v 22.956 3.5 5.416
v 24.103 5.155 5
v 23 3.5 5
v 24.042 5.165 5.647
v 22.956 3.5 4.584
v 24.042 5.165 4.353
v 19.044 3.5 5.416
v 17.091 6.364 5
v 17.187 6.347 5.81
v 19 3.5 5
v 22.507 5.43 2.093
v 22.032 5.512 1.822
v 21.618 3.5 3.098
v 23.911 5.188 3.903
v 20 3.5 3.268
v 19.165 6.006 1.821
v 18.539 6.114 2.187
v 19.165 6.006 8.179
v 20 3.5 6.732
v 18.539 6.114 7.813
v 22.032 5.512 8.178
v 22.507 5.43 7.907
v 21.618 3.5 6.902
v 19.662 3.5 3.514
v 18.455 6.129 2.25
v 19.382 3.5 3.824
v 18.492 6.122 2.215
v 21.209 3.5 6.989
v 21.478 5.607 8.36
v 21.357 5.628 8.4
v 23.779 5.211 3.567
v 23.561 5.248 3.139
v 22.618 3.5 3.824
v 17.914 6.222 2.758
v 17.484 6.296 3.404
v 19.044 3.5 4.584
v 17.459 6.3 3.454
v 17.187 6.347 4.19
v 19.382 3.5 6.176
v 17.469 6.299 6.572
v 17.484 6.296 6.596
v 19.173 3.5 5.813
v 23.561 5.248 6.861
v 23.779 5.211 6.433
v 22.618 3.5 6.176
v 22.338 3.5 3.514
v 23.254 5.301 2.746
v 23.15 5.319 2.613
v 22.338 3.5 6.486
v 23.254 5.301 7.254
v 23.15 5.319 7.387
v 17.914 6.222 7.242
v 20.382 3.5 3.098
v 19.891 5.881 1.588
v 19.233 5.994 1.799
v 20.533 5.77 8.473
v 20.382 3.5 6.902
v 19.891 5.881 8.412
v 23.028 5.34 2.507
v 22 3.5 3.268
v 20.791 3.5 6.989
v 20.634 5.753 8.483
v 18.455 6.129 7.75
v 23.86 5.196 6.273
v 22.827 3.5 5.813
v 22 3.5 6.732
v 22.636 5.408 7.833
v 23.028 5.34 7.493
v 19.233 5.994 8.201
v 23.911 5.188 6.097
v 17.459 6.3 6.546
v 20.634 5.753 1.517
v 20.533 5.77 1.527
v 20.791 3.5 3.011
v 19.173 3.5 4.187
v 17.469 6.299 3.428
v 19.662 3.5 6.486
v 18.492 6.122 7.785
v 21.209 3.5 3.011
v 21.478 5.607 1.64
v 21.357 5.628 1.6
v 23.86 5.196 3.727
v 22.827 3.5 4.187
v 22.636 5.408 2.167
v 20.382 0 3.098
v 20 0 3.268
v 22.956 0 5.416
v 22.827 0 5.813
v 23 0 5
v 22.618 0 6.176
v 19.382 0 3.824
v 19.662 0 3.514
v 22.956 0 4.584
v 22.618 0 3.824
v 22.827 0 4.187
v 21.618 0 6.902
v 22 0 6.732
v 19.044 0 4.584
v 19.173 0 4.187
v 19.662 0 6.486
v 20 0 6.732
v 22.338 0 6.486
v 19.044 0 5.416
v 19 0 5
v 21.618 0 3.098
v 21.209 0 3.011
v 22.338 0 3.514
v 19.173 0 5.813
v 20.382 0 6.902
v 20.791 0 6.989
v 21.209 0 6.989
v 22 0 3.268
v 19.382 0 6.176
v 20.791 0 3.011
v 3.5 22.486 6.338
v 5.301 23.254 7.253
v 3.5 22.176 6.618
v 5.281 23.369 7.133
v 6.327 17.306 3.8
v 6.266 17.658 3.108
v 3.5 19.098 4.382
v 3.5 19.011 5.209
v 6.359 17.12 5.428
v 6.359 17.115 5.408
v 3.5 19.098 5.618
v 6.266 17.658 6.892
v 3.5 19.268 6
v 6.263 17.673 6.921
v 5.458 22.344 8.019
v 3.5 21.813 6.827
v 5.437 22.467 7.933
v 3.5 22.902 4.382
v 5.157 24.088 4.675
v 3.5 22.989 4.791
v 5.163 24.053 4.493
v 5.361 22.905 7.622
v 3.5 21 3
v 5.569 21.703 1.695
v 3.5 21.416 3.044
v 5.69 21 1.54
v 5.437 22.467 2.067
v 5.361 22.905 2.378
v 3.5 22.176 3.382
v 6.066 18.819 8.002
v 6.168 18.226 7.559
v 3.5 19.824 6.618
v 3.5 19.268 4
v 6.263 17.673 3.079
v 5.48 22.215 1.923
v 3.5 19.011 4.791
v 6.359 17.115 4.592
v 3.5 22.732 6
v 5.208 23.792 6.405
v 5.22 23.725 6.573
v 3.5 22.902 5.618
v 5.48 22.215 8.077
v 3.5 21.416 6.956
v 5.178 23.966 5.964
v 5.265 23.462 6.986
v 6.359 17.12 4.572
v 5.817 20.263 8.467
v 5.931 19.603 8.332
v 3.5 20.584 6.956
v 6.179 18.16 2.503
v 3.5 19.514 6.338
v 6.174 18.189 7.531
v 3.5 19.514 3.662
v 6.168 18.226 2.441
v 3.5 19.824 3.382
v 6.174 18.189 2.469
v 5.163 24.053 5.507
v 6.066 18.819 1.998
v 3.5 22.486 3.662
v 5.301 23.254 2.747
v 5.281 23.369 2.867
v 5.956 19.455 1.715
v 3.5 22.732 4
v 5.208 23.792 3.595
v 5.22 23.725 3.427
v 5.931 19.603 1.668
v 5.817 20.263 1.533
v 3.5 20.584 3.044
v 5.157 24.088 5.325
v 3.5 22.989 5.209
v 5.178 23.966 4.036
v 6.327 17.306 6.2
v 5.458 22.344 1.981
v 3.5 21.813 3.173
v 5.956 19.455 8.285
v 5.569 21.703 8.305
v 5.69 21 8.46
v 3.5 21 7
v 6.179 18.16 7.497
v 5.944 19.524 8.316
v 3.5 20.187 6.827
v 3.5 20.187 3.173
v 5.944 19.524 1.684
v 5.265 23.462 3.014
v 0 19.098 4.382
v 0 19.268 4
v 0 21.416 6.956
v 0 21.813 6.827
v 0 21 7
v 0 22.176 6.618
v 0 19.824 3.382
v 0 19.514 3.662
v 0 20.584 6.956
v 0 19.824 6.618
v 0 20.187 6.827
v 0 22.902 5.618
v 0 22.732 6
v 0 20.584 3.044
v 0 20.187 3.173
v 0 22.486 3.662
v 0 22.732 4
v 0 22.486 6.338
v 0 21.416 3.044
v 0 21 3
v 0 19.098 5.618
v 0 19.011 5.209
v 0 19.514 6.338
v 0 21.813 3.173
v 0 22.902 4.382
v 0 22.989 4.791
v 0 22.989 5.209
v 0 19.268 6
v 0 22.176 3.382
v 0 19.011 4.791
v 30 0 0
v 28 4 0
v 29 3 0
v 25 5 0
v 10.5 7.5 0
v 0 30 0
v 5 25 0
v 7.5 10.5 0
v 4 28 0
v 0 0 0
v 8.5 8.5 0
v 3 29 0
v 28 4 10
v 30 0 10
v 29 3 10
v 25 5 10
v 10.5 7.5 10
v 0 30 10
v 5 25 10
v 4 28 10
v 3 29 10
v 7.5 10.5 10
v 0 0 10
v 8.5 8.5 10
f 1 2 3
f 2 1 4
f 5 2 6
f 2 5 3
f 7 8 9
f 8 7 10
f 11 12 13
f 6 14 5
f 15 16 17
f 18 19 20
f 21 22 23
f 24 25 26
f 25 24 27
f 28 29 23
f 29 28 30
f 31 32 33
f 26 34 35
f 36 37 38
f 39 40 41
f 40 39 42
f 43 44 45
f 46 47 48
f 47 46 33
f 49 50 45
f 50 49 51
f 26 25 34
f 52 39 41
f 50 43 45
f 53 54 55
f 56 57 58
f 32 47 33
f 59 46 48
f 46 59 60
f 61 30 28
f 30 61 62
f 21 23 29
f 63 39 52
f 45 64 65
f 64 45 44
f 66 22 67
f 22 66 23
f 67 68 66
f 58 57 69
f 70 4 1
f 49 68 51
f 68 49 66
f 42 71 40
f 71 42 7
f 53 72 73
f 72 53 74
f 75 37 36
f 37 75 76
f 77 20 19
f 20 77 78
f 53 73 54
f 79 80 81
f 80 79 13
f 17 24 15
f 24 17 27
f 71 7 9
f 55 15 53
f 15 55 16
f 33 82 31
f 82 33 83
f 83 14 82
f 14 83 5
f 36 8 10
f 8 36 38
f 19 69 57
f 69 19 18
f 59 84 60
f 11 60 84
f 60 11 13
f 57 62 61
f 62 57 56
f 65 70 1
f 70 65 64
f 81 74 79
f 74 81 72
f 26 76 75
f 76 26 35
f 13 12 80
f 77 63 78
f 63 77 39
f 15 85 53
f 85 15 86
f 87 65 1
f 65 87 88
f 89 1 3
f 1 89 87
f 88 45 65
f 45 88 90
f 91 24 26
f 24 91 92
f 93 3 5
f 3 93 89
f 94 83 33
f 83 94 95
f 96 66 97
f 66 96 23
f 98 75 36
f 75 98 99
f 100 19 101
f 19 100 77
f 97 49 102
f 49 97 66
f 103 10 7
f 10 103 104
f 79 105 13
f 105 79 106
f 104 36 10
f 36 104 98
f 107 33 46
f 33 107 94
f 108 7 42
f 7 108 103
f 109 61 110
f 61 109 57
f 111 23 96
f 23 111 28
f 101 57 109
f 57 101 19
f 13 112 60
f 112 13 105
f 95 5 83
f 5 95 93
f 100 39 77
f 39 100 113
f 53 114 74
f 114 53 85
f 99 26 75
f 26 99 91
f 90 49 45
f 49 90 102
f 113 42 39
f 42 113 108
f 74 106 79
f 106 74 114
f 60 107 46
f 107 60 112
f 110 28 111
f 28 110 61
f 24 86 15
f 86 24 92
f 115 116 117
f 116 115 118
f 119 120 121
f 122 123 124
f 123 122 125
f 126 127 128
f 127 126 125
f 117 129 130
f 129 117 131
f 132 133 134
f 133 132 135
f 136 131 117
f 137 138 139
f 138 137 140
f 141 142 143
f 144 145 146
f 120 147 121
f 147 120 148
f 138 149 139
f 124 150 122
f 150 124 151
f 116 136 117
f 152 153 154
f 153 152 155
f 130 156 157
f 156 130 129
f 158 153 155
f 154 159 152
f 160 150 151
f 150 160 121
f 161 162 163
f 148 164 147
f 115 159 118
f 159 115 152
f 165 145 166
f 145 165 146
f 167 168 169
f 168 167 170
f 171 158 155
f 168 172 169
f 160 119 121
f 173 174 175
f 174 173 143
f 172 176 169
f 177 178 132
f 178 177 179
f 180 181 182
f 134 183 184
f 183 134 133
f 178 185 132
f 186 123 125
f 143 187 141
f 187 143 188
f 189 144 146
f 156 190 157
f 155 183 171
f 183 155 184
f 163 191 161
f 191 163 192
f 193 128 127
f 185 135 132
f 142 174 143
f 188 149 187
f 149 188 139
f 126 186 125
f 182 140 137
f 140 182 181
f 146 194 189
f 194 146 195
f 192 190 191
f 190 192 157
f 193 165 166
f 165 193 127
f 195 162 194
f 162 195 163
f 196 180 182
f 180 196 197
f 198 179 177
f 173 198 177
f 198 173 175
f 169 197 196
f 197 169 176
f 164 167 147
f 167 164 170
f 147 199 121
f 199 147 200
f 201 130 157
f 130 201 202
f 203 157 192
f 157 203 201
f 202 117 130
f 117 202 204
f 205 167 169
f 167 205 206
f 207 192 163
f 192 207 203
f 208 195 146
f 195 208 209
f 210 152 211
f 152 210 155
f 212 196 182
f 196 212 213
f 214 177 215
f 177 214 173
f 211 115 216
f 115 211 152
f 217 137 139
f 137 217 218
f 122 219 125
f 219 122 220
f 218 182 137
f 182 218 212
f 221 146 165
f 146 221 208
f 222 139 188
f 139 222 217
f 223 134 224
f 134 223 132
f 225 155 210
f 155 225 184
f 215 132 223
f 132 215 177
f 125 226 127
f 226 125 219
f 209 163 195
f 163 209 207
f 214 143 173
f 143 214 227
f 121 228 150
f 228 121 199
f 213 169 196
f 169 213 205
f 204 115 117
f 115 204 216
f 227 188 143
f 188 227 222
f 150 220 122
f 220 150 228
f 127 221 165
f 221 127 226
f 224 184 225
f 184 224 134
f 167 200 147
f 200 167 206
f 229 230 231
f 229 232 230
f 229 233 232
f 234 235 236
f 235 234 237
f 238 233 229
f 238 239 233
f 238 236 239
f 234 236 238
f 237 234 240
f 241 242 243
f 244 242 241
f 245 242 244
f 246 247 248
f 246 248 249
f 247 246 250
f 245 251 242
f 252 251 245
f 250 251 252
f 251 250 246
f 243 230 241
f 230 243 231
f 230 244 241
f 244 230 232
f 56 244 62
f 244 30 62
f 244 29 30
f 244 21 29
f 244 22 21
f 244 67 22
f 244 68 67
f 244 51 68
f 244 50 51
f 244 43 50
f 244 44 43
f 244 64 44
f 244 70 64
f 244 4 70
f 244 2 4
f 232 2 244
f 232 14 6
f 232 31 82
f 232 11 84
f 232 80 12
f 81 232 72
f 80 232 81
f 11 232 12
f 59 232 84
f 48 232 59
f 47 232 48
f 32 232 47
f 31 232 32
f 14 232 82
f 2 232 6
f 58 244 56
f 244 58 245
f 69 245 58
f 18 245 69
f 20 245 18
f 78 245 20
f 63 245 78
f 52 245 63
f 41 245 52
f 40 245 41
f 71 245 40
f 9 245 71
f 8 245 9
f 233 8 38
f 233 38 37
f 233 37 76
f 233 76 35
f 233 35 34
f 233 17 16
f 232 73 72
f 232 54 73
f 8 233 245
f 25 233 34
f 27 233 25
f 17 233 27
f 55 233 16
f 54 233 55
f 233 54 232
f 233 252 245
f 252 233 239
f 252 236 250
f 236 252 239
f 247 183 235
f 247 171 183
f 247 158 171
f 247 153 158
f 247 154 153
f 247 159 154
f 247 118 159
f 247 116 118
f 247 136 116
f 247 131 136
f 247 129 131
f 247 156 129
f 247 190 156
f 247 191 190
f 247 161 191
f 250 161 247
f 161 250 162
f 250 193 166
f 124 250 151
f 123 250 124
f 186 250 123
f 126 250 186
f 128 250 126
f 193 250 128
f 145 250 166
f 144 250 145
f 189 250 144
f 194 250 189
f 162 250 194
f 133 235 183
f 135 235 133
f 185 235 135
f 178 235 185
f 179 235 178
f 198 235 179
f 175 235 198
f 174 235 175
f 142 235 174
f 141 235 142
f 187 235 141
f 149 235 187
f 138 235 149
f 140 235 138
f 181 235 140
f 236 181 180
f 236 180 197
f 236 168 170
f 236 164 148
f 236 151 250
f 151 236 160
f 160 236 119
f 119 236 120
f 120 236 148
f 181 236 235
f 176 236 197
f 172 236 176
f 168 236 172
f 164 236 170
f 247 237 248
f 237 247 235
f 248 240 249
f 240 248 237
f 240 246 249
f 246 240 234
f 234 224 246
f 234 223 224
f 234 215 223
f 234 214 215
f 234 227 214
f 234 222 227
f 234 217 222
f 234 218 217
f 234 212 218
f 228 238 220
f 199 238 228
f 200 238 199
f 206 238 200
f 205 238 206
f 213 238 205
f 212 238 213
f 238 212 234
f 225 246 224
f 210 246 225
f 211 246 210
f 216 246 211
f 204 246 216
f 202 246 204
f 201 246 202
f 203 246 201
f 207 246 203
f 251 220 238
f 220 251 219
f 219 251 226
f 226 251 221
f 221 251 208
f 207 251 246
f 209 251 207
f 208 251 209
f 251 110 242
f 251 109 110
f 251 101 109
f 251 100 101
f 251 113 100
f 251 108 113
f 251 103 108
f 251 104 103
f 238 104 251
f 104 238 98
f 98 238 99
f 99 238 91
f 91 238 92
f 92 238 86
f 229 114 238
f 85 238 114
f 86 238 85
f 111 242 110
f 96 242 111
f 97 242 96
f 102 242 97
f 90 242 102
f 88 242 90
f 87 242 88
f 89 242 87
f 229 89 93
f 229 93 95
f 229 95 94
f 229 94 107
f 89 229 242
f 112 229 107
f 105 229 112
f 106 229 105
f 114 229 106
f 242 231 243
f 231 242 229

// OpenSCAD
l = 30;
w = 10;
d = 5;

hr = 2; 

$fn = 30;

hole_margin = 2;
margin_height = 2;

small = 1;


difference() {
linear_extrude(w) polygon([
    [0,0],
    [l,0],
    [l-1,d-2],
    [l-2,d-1],
    [l-5,d],
    [d*1.5+3,d*1.5],
    [d*1.5+1,d*1.5+1 ],
    [d*1.5,d*1.5+3],
    [d,l-5],
    [d-1,l-2],
    [d-2,l-1],
    [0,l]
    ]);
small = 1;
translate([l-5-hr-hole_margin,d,w/2]) rotate([90,0,0]) {
    cylinder(margin_height+small,hr+hole_margin,hr,center=true);
    cylinder(10000,hr,hr,center=true);
 }
translate([d,l-5-hr-hole_margin,w/2]) rotate([0,-90,0]) {
    cylinder(margin_height+small,hr+hole_margin,hr,center=true);
    cylinder(10000,hr,hr,center=true);    
    }
}
